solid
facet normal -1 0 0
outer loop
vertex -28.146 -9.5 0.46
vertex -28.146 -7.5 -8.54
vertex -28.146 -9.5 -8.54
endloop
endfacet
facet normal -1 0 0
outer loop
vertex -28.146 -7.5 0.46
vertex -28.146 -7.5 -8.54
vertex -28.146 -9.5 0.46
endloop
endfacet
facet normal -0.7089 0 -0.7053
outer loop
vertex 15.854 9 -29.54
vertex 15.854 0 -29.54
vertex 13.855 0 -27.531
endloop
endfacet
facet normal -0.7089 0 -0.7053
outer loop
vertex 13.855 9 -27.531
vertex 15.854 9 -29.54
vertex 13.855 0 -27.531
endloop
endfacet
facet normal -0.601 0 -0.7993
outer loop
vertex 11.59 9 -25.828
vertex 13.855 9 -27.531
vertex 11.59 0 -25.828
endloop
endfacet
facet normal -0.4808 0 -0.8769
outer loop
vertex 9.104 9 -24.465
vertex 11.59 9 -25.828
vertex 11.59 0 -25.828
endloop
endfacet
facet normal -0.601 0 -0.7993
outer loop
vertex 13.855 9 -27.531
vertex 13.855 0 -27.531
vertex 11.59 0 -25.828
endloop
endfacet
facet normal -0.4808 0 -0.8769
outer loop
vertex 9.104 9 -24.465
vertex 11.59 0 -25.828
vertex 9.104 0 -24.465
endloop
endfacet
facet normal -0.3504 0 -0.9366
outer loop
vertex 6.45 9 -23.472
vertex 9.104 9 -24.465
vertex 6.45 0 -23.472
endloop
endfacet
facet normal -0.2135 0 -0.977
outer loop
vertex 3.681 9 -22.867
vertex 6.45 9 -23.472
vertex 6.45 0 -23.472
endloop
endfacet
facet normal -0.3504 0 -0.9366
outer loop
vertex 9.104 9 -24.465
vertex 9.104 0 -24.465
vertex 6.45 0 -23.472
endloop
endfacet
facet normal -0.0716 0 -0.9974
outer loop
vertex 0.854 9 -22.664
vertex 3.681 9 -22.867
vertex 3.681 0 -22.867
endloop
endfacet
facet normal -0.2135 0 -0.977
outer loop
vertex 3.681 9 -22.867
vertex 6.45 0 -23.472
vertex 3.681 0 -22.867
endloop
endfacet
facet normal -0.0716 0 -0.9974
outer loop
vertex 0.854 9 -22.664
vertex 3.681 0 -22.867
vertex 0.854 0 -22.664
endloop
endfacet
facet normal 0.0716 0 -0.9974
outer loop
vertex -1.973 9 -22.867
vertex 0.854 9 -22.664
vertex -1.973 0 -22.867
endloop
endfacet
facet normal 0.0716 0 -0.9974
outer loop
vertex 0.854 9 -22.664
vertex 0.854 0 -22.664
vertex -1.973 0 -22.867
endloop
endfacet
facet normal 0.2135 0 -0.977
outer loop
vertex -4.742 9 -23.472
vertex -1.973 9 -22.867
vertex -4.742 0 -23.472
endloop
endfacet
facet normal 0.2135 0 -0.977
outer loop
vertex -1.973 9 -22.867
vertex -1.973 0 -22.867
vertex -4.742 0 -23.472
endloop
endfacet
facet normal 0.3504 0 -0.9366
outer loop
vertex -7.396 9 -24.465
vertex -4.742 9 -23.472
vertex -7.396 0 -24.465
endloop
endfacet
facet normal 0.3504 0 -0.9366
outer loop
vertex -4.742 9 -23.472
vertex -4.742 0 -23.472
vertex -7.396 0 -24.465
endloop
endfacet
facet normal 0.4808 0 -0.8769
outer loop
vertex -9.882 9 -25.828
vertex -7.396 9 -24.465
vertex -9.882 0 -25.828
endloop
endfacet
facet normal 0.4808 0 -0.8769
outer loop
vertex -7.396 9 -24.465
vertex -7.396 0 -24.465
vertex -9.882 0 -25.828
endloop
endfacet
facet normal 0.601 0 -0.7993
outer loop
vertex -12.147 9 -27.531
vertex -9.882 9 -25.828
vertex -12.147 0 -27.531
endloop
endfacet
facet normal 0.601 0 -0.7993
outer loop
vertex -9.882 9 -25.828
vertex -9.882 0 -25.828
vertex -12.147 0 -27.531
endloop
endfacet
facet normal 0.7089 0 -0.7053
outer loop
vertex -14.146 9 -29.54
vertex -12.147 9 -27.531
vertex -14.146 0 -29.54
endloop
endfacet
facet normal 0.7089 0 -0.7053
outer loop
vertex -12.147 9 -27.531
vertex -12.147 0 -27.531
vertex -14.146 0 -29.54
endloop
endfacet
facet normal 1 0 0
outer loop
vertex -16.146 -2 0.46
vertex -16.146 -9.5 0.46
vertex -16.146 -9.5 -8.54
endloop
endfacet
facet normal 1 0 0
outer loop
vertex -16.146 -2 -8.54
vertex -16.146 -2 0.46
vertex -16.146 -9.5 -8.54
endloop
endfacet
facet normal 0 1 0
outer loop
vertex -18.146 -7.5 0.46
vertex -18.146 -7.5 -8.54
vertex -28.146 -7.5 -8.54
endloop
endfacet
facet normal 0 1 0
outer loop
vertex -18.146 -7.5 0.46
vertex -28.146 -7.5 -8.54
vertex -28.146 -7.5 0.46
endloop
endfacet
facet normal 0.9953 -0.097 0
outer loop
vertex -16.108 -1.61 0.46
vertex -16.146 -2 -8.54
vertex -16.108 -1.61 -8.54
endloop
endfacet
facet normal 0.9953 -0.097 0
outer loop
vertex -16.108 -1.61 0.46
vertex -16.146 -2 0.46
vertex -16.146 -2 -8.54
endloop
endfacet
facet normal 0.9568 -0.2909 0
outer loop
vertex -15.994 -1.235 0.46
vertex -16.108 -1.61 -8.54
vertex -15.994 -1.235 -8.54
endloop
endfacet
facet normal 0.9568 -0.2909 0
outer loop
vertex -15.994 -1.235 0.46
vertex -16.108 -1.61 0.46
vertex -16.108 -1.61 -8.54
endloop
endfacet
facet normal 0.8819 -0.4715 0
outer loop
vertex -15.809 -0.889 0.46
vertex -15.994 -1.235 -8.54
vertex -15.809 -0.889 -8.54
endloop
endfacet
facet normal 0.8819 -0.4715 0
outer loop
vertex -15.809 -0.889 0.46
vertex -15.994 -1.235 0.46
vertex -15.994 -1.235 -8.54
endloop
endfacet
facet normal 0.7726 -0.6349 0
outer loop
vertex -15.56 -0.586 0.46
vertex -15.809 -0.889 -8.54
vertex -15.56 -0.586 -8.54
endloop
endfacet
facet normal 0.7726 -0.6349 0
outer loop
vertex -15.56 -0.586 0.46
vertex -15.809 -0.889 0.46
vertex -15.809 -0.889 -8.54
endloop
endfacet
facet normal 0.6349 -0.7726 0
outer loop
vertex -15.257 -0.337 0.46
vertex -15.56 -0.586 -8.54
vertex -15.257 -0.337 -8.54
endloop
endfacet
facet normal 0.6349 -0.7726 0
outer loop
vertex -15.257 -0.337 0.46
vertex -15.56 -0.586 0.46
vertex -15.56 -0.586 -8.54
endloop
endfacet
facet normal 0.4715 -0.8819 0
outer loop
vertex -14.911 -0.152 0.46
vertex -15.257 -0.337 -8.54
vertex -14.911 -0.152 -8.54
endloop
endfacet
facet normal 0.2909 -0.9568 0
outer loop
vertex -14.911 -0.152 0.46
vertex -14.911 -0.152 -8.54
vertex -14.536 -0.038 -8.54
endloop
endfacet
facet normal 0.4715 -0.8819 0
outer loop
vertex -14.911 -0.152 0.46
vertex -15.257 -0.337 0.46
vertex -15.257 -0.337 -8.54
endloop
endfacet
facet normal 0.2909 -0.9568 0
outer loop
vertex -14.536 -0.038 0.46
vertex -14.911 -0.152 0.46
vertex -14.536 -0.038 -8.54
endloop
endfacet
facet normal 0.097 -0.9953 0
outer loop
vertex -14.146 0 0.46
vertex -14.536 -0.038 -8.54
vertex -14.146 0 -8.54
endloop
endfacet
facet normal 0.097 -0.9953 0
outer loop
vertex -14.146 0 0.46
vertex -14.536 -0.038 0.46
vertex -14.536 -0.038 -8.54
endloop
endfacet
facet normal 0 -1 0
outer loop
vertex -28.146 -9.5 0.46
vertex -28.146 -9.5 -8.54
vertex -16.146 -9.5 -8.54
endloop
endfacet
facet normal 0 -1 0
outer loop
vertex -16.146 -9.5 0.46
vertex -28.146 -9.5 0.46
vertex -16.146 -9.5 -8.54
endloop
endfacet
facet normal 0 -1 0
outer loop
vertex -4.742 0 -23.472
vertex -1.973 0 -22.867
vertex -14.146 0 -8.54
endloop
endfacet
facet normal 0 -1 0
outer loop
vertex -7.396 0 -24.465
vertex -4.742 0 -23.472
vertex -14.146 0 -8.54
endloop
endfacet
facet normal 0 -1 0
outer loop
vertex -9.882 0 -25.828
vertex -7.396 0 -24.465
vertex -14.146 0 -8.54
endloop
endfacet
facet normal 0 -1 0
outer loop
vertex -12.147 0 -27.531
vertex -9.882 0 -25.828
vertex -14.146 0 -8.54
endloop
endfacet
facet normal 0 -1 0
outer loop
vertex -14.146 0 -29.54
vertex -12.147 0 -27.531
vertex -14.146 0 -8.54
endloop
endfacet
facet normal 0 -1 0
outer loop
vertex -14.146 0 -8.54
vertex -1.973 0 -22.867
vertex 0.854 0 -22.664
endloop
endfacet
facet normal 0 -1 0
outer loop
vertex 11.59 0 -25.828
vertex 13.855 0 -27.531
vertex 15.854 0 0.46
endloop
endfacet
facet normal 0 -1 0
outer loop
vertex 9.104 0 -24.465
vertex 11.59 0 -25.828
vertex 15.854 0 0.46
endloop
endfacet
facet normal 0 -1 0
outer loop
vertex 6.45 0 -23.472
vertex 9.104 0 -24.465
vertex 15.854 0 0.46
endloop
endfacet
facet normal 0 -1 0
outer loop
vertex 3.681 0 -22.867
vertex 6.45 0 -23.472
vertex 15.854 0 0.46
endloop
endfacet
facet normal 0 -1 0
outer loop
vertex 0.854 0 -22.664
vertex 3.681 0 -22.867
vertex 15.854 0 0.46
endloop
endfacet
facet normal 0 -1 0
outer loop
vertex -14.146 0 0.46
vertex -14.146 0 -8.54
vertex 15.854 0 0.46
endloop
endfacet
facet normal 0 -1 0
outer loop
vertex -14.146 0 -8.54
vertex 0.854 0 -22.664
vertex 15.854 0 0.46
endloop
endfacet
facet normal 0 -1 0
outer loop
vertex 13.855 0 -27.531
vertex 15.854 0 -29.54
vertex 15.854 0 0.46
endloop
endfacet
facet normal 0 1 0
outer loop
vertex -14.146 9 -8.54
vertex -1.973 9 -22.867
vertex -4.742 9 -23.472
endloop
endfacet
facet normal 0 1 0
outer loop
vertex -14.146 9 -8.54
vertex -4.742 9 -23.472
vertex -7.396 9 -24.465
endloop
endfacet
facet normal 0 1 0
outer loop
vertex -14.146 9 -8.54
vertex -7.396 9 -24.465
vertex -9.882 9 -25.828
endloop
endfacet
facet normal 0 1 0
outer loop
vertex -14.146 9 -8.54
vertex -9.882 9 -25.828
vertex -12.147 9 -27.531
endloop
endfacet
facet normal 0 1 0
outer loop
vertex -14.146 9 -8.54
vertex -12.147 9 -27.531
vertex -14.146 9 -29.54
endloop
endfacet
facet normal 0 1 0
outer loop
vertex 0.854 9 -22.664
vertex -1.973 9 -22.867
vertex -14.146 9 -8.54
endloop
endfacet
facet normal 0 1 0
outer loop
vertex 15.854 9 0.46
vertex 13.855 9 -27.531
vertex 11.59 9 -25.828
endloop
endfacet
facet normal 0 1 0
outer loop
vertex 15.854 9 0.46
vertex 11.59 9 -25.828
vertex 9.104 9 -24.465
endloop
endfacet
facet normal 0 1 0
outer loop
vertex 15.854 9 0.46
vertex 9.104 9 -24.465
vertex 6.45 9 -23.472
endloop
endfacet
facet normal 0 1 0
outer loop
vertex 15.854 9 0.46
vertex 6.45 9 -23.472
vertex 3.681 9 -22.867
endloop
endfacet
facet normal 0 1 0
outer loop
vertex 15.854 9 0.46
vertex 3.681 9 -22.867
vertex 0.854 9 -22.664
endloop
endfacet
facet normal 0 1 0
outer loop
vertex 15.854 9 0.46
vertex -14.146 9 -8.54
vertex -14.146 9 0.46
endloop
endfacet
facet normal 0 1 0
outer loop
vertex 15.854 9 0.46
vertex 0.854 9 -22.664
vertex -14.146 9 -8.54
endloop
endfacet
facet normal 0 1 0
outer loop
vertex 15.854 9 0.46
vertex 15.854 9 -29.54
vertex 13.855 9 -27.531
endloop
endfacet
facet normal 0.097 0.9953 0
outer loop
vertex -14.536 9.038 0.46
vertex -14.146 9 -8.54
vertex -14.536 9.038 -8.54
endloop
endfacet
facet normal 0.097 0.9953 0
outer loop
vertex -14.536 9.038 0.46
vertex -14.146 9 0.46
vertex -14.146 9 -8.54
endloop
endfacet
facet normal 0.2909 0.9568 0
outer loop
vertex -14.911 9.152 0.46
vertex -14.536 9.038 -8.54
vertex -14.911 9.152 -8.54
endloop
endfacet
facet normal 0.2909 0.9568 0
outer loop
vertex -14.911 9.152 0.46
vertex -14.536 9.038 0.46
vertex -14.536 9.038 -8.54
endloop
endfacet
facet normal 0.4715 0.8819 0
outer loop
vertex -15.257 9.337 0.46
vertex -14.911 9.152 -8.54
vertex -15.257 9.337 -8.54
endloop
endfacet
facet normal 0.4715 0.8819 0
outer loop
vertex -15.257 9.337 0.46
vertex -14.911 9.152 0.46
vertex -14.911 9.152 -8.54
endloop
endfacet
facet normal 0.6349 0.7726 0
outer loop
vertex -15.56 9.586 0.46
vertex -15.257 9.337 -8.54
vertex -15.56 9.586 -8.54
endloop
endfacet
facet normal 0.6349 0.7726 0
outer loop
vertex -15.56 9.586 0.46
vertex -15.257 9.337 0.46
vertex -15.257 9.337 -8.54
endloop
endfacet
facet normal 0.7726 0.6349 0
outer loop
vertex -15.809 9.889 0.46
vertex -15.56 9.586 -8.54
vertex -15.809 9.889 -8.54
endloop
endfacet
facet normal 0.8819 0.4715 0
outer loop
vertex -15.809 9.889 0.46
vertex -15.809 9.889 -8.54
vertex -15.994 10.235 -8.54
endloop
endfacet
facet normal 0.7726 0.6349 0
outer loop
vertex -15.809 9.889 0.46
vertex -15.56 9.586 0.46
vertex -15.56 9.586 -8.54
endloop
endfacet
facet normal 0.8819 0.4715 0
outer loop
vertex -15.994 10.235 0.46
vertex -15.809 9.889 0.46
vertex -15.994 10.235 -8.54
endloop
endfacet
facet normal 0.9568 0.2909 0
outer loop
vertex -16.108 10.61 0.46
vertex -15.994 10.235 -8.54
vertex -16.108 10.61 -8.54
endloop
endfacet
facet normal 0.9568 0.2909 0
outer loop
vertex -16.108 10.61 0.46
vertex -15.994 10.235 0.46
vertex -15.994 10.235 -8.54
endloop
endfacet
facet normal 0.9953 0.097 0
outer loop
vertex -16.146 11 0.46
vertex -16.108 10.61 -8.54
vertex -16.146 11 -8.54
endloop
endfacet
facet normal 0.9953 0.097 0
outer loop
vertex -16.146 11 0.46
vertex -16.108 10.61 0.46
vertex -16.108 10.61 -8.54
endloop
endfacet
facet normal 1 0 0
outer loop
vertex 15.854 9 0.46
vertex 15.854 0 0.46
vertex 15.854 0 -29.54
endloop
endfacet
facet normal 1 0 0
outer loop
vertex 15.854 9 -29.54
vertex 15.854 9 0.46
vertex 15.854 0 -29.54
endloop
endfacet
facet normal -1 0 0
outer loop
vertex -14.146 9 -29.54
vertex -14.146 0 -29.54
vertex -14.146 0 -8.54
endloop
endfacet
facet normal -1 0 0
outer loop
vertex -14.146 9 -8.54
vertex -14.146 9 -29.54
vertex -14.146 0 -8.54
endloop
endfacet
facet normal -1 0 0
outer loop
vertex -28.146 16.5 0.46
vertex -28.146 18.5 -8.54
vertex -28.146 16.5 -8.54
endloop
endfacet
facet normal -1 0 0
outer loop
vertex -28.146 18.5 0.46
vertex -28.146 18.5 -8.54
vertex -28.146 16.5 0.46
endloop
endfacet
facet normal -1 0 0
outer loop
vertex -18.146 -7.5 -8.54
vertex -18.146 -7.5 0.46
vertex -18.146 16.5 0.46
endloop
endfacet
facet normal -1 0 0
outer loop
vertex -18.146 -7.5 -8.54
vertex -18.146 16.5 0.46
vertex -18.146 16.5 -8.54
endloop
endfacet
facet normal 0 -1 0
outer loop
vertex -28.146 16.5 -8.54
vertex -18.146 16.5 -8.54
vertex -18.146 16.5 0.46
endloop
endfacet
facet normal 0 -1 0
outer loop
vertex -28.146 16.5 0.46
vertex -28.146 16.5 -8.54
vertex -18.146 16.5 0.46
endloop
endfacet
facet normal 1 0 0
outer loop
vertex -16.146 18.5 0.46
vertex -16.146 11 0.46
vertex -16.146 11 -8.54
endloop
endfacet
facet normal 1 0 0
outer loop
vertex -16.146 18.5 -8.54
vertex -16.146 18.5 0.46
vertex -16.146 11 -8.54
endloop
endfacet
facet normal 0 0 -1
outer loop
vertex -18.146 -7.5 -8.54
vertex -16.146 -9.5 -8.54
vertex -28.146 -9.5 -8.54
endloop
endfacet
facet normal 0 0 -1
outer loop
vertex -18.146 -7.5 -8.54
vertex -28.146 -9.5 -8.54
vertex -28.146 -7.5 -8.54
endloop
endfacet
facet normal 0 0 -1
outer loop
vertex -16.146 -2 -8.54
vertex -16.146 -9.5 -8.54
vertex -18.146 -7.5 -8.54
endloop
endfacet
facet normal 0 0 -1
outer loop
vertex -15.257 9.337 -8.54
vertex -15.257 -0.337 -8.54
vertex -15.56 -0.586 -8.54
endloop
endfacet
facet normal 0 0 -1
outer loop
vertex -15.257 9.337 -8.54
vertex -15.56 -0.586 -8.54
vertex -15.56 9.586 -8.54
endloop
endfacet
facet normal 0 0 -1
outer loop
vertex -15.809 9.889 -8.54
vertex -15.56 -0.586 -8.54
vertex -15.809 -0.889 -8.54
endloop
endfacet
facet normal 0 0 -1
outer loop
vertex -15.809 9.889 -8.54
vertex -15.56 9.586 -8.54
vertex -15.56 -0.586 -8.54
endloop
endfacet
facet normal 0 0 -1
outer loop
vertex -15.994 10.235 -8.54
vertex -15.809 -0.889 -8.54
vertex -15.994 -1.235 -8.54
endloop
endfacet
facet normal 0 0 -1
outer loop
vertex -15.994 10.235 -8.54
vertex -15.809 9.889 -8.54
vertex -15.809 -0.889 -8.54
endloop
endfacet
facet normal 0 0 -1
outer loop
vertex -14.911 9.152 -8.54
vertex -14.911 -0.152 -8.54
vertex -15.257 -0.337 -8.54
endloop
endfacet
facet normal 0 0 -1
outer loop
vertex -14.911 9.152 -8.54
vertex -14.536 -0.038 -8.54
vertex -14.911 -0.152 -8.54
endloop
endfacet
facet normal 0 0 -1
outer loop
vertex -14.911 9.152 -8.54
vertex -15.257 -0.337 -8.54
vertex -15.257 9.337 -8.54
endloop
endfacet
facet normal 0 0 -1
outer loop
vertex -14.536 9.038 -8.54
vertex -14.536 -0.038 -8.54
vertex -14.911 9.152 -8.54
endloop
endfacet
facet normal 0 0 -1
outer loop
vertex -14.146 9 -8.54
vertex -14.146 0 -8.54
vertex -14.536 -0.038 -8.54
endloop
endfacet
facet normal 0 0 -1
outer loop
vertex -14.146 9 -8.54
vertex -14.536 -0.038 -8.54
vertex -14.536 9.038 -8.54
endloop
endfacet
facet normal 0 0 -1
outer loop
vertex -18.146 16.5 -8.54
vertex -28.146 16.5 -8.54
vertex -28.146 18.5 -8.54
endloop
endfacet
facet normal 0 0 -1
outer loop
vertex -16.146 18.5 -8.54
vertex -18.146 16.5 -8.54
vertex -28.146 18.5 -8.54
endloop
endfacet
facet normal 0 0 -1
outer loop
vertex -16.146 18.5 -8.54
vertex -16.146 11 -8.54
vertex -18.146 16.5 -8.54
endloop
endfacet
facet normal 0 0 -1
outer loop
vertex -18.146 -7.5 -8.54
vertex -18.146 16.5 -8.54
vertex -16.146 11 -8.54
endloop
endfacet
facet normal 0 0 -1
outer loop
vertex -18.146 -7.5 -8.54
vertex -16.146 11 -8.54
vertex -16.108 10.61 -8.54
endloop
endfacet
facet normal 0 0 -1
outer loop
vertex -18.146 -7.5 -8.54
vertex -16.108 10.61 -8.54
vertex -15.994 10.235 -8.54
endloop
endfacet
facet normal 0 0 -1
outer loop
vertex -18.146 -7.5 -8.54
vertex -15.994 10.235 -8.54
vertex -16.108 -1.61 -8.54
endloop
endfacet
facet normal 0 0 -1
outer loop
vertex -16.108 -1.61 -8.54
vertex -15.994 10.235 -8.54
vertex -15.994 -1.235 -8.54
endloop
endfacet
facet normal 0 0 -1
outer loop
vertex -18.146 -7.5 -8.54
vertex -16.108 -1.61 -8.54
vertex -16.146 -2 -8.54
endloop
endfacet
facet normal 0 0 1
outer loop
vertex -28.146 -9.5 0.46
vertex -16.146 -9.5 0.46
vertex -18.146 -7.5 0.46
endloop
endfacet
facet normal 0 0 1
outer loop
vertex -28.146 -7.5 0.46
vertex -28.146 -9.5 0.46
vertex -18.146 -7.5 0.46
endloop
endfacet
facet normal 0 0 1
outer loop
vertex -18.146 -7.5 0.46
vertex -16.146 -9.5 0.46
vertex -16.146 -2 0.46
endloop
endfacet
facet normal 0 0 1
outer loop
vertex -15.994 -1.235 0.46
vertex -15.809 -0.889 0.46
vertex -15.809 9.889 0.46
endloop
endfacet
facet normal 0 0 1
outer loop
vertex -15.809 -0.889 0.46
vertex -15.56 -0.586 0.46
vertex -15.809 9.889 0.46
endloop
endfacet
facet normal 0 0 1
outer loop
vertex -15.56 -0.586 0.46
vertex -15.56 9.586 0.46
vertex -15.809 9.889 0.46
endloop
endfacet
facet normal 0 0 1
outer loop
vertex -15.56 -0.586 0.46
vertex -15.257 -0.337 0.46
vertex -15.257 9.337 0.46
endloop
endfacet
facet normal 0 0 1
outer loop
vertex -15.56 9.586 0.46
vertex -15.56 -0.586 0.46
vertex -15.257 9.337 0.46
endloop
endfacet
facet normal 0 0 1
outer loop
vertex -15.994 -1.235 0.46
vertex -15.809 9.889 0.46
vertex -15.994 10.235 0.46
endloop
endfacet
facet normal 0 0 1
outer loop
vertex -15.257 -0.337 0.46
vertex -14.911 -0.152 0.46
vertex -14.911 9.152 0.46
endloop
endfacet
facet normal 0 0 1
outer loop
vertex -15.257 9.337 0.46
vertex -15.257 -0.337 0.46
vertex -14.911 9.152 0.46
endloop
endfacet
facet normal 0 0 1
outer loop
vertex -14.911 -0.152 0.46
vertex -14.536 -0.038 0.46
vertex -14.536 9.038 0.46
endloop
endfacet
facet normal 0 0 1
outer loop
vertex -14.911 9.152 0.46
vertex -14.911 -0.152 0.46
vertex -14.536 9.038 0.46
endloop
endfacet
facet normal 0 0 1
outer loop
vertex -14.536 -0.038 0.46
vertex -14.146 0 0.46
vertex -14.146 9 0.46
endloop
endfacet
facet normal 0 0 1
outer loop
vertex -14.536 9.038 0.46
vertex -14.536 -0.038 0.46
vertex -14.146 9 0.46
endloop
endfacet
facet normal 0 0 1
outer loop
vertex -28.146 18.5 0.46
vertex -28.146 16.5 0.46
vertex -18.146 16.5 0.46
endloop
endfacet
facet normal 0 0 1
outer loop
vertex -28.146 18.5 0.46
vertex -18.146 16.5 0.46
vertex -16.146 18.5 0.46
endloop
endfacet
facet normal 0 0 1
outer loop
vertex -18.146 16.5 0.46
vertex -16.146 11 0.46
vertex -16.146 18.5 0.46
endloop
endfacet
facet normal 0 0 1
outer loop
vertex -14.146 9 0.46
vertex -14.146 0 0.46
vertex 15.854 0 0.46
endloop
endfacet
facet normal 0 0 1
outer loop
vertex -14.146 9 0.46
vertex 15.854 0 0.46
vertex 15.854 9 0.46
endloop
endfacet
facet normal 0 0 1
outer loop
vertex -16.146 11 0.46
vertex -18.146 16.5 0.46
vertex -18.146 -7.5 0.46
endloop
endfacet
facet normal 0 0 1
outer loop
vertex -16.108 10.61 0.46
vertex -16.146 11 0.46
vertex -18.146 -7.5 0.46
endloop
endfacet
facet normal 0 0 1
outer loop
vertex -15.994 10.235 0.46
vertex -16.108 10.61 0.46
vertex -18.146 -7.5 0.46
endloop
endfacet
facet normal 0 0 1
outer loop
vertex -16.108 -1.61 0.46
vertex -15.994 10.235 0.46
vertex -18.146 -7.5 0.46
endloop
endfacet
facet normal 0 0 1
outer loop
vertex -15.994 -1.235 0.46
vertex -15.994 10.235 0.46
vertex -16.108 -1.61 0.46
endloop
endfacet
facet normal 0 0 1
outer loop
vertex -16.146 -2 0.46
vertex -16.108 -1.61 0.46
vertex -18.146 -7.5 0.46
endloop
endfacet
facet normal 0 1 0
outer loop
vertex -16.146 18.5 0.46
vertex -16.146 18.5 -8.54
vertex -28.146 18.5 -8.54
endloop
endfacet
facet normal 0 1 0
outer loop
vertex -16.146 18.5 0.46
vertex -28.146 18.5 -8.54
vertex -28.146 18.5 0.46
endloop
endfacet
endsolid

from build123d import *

# Parameters (mm, degrees)
EXTRUDE_1_DEPTH      = 9
SKETCH_2_W           = 9
SKETCH_2_H           = 9
EXTRUDE_2_DEPTH      = 2
EXTRUDE_5_DEPTH      = 9.5
EXTRUDE_5_DEPTH_BACK = 18.5
SKETCH_3_W           = 2
SKETCH_3_H           = 9
SKETCH_5_W           = 9
SKETCH_5_H           = 2
EXTRUDE_6_DEPTH      = 10
FILLET_2_R           = 2


with BuildPart() as part:
    # 草图1 → 凸台-拉伸1 (new body)
    with BuildSketch(Plane(origin=(0, 0, 0), x_dir=(1, 0, 0), z_dir=(0, 1, 0))):
        with BuildLine():
            ThreePointArc((15.854056032, 29.540059463), (0.854056032, 22.664455), (-14.145943968, 29.540059463))
            Line((-14.145943968, 29.540059463), (-14.145943968, -0.459940537))
            Line((-14.145943968, -0.459940537), (15.854056032, -0.459940537))
            Line((15.854056032, -0.459940537), (15.854056032, 29.540059463))
        make_face()
    extrude(amount=EXTRUDE_1_DEPTH)

    # 草图2 → 凸台-拉伸2 (add)
    with BuildSketch(Plane.ZY.offset(14.145943968)):
        with Locations((-4.040059463, 4.5)):
            Rectangle(SKETCH_2_W, SKETCH_2_H)
    extrude(amount=EXTRUDE_2_DEPTH)

    # 草图3 → 凸台-拉伸5 (add, two sides: drawn at the far end of the back side and taken through both)
    with BuildSketch(Plane(origin=(0, 9, 0), x_dir=(1, 0, 0), z_dir=(0, 1, 0)).offset(-EXTRUDE_5_DEPTH_BACK)):
        with Locations((-17.145943968, 4.040059463)):
            Rectangle(SKETCH_3_W, SKETCH_3_H)
    extrude(amount=EXTRUDE_5_DEPTH + EXTRUDE_5_DEPTH_BACK)

    # 草图5 → 凸台-拉伸6 (add)
    with BuildSketch(Plane.ZY.offset(18.145943968)):
        with Locations((-4.040059463, 17.5)):
            Rectangle(SKETCH_5_W, SKETCH_5_H)
        with Locations((-4.040059463, -8.5)):
            Rectangle(SKETCH_5_W, SKETCH_5_H)
    extrude(amount=EXTRUDE_6_DEPTH)

    # 圆角2
    fillet_2_edges = [part.edges().sort_by_distance(p)[0] for p in [
        (-16.145943968, 0, -4.040059463),
        (-16.145943968, 9, -4.040059463),
    ]]
    fillet(fillet_2_edges, radius=FILLET_2_R)


solid = part.part
